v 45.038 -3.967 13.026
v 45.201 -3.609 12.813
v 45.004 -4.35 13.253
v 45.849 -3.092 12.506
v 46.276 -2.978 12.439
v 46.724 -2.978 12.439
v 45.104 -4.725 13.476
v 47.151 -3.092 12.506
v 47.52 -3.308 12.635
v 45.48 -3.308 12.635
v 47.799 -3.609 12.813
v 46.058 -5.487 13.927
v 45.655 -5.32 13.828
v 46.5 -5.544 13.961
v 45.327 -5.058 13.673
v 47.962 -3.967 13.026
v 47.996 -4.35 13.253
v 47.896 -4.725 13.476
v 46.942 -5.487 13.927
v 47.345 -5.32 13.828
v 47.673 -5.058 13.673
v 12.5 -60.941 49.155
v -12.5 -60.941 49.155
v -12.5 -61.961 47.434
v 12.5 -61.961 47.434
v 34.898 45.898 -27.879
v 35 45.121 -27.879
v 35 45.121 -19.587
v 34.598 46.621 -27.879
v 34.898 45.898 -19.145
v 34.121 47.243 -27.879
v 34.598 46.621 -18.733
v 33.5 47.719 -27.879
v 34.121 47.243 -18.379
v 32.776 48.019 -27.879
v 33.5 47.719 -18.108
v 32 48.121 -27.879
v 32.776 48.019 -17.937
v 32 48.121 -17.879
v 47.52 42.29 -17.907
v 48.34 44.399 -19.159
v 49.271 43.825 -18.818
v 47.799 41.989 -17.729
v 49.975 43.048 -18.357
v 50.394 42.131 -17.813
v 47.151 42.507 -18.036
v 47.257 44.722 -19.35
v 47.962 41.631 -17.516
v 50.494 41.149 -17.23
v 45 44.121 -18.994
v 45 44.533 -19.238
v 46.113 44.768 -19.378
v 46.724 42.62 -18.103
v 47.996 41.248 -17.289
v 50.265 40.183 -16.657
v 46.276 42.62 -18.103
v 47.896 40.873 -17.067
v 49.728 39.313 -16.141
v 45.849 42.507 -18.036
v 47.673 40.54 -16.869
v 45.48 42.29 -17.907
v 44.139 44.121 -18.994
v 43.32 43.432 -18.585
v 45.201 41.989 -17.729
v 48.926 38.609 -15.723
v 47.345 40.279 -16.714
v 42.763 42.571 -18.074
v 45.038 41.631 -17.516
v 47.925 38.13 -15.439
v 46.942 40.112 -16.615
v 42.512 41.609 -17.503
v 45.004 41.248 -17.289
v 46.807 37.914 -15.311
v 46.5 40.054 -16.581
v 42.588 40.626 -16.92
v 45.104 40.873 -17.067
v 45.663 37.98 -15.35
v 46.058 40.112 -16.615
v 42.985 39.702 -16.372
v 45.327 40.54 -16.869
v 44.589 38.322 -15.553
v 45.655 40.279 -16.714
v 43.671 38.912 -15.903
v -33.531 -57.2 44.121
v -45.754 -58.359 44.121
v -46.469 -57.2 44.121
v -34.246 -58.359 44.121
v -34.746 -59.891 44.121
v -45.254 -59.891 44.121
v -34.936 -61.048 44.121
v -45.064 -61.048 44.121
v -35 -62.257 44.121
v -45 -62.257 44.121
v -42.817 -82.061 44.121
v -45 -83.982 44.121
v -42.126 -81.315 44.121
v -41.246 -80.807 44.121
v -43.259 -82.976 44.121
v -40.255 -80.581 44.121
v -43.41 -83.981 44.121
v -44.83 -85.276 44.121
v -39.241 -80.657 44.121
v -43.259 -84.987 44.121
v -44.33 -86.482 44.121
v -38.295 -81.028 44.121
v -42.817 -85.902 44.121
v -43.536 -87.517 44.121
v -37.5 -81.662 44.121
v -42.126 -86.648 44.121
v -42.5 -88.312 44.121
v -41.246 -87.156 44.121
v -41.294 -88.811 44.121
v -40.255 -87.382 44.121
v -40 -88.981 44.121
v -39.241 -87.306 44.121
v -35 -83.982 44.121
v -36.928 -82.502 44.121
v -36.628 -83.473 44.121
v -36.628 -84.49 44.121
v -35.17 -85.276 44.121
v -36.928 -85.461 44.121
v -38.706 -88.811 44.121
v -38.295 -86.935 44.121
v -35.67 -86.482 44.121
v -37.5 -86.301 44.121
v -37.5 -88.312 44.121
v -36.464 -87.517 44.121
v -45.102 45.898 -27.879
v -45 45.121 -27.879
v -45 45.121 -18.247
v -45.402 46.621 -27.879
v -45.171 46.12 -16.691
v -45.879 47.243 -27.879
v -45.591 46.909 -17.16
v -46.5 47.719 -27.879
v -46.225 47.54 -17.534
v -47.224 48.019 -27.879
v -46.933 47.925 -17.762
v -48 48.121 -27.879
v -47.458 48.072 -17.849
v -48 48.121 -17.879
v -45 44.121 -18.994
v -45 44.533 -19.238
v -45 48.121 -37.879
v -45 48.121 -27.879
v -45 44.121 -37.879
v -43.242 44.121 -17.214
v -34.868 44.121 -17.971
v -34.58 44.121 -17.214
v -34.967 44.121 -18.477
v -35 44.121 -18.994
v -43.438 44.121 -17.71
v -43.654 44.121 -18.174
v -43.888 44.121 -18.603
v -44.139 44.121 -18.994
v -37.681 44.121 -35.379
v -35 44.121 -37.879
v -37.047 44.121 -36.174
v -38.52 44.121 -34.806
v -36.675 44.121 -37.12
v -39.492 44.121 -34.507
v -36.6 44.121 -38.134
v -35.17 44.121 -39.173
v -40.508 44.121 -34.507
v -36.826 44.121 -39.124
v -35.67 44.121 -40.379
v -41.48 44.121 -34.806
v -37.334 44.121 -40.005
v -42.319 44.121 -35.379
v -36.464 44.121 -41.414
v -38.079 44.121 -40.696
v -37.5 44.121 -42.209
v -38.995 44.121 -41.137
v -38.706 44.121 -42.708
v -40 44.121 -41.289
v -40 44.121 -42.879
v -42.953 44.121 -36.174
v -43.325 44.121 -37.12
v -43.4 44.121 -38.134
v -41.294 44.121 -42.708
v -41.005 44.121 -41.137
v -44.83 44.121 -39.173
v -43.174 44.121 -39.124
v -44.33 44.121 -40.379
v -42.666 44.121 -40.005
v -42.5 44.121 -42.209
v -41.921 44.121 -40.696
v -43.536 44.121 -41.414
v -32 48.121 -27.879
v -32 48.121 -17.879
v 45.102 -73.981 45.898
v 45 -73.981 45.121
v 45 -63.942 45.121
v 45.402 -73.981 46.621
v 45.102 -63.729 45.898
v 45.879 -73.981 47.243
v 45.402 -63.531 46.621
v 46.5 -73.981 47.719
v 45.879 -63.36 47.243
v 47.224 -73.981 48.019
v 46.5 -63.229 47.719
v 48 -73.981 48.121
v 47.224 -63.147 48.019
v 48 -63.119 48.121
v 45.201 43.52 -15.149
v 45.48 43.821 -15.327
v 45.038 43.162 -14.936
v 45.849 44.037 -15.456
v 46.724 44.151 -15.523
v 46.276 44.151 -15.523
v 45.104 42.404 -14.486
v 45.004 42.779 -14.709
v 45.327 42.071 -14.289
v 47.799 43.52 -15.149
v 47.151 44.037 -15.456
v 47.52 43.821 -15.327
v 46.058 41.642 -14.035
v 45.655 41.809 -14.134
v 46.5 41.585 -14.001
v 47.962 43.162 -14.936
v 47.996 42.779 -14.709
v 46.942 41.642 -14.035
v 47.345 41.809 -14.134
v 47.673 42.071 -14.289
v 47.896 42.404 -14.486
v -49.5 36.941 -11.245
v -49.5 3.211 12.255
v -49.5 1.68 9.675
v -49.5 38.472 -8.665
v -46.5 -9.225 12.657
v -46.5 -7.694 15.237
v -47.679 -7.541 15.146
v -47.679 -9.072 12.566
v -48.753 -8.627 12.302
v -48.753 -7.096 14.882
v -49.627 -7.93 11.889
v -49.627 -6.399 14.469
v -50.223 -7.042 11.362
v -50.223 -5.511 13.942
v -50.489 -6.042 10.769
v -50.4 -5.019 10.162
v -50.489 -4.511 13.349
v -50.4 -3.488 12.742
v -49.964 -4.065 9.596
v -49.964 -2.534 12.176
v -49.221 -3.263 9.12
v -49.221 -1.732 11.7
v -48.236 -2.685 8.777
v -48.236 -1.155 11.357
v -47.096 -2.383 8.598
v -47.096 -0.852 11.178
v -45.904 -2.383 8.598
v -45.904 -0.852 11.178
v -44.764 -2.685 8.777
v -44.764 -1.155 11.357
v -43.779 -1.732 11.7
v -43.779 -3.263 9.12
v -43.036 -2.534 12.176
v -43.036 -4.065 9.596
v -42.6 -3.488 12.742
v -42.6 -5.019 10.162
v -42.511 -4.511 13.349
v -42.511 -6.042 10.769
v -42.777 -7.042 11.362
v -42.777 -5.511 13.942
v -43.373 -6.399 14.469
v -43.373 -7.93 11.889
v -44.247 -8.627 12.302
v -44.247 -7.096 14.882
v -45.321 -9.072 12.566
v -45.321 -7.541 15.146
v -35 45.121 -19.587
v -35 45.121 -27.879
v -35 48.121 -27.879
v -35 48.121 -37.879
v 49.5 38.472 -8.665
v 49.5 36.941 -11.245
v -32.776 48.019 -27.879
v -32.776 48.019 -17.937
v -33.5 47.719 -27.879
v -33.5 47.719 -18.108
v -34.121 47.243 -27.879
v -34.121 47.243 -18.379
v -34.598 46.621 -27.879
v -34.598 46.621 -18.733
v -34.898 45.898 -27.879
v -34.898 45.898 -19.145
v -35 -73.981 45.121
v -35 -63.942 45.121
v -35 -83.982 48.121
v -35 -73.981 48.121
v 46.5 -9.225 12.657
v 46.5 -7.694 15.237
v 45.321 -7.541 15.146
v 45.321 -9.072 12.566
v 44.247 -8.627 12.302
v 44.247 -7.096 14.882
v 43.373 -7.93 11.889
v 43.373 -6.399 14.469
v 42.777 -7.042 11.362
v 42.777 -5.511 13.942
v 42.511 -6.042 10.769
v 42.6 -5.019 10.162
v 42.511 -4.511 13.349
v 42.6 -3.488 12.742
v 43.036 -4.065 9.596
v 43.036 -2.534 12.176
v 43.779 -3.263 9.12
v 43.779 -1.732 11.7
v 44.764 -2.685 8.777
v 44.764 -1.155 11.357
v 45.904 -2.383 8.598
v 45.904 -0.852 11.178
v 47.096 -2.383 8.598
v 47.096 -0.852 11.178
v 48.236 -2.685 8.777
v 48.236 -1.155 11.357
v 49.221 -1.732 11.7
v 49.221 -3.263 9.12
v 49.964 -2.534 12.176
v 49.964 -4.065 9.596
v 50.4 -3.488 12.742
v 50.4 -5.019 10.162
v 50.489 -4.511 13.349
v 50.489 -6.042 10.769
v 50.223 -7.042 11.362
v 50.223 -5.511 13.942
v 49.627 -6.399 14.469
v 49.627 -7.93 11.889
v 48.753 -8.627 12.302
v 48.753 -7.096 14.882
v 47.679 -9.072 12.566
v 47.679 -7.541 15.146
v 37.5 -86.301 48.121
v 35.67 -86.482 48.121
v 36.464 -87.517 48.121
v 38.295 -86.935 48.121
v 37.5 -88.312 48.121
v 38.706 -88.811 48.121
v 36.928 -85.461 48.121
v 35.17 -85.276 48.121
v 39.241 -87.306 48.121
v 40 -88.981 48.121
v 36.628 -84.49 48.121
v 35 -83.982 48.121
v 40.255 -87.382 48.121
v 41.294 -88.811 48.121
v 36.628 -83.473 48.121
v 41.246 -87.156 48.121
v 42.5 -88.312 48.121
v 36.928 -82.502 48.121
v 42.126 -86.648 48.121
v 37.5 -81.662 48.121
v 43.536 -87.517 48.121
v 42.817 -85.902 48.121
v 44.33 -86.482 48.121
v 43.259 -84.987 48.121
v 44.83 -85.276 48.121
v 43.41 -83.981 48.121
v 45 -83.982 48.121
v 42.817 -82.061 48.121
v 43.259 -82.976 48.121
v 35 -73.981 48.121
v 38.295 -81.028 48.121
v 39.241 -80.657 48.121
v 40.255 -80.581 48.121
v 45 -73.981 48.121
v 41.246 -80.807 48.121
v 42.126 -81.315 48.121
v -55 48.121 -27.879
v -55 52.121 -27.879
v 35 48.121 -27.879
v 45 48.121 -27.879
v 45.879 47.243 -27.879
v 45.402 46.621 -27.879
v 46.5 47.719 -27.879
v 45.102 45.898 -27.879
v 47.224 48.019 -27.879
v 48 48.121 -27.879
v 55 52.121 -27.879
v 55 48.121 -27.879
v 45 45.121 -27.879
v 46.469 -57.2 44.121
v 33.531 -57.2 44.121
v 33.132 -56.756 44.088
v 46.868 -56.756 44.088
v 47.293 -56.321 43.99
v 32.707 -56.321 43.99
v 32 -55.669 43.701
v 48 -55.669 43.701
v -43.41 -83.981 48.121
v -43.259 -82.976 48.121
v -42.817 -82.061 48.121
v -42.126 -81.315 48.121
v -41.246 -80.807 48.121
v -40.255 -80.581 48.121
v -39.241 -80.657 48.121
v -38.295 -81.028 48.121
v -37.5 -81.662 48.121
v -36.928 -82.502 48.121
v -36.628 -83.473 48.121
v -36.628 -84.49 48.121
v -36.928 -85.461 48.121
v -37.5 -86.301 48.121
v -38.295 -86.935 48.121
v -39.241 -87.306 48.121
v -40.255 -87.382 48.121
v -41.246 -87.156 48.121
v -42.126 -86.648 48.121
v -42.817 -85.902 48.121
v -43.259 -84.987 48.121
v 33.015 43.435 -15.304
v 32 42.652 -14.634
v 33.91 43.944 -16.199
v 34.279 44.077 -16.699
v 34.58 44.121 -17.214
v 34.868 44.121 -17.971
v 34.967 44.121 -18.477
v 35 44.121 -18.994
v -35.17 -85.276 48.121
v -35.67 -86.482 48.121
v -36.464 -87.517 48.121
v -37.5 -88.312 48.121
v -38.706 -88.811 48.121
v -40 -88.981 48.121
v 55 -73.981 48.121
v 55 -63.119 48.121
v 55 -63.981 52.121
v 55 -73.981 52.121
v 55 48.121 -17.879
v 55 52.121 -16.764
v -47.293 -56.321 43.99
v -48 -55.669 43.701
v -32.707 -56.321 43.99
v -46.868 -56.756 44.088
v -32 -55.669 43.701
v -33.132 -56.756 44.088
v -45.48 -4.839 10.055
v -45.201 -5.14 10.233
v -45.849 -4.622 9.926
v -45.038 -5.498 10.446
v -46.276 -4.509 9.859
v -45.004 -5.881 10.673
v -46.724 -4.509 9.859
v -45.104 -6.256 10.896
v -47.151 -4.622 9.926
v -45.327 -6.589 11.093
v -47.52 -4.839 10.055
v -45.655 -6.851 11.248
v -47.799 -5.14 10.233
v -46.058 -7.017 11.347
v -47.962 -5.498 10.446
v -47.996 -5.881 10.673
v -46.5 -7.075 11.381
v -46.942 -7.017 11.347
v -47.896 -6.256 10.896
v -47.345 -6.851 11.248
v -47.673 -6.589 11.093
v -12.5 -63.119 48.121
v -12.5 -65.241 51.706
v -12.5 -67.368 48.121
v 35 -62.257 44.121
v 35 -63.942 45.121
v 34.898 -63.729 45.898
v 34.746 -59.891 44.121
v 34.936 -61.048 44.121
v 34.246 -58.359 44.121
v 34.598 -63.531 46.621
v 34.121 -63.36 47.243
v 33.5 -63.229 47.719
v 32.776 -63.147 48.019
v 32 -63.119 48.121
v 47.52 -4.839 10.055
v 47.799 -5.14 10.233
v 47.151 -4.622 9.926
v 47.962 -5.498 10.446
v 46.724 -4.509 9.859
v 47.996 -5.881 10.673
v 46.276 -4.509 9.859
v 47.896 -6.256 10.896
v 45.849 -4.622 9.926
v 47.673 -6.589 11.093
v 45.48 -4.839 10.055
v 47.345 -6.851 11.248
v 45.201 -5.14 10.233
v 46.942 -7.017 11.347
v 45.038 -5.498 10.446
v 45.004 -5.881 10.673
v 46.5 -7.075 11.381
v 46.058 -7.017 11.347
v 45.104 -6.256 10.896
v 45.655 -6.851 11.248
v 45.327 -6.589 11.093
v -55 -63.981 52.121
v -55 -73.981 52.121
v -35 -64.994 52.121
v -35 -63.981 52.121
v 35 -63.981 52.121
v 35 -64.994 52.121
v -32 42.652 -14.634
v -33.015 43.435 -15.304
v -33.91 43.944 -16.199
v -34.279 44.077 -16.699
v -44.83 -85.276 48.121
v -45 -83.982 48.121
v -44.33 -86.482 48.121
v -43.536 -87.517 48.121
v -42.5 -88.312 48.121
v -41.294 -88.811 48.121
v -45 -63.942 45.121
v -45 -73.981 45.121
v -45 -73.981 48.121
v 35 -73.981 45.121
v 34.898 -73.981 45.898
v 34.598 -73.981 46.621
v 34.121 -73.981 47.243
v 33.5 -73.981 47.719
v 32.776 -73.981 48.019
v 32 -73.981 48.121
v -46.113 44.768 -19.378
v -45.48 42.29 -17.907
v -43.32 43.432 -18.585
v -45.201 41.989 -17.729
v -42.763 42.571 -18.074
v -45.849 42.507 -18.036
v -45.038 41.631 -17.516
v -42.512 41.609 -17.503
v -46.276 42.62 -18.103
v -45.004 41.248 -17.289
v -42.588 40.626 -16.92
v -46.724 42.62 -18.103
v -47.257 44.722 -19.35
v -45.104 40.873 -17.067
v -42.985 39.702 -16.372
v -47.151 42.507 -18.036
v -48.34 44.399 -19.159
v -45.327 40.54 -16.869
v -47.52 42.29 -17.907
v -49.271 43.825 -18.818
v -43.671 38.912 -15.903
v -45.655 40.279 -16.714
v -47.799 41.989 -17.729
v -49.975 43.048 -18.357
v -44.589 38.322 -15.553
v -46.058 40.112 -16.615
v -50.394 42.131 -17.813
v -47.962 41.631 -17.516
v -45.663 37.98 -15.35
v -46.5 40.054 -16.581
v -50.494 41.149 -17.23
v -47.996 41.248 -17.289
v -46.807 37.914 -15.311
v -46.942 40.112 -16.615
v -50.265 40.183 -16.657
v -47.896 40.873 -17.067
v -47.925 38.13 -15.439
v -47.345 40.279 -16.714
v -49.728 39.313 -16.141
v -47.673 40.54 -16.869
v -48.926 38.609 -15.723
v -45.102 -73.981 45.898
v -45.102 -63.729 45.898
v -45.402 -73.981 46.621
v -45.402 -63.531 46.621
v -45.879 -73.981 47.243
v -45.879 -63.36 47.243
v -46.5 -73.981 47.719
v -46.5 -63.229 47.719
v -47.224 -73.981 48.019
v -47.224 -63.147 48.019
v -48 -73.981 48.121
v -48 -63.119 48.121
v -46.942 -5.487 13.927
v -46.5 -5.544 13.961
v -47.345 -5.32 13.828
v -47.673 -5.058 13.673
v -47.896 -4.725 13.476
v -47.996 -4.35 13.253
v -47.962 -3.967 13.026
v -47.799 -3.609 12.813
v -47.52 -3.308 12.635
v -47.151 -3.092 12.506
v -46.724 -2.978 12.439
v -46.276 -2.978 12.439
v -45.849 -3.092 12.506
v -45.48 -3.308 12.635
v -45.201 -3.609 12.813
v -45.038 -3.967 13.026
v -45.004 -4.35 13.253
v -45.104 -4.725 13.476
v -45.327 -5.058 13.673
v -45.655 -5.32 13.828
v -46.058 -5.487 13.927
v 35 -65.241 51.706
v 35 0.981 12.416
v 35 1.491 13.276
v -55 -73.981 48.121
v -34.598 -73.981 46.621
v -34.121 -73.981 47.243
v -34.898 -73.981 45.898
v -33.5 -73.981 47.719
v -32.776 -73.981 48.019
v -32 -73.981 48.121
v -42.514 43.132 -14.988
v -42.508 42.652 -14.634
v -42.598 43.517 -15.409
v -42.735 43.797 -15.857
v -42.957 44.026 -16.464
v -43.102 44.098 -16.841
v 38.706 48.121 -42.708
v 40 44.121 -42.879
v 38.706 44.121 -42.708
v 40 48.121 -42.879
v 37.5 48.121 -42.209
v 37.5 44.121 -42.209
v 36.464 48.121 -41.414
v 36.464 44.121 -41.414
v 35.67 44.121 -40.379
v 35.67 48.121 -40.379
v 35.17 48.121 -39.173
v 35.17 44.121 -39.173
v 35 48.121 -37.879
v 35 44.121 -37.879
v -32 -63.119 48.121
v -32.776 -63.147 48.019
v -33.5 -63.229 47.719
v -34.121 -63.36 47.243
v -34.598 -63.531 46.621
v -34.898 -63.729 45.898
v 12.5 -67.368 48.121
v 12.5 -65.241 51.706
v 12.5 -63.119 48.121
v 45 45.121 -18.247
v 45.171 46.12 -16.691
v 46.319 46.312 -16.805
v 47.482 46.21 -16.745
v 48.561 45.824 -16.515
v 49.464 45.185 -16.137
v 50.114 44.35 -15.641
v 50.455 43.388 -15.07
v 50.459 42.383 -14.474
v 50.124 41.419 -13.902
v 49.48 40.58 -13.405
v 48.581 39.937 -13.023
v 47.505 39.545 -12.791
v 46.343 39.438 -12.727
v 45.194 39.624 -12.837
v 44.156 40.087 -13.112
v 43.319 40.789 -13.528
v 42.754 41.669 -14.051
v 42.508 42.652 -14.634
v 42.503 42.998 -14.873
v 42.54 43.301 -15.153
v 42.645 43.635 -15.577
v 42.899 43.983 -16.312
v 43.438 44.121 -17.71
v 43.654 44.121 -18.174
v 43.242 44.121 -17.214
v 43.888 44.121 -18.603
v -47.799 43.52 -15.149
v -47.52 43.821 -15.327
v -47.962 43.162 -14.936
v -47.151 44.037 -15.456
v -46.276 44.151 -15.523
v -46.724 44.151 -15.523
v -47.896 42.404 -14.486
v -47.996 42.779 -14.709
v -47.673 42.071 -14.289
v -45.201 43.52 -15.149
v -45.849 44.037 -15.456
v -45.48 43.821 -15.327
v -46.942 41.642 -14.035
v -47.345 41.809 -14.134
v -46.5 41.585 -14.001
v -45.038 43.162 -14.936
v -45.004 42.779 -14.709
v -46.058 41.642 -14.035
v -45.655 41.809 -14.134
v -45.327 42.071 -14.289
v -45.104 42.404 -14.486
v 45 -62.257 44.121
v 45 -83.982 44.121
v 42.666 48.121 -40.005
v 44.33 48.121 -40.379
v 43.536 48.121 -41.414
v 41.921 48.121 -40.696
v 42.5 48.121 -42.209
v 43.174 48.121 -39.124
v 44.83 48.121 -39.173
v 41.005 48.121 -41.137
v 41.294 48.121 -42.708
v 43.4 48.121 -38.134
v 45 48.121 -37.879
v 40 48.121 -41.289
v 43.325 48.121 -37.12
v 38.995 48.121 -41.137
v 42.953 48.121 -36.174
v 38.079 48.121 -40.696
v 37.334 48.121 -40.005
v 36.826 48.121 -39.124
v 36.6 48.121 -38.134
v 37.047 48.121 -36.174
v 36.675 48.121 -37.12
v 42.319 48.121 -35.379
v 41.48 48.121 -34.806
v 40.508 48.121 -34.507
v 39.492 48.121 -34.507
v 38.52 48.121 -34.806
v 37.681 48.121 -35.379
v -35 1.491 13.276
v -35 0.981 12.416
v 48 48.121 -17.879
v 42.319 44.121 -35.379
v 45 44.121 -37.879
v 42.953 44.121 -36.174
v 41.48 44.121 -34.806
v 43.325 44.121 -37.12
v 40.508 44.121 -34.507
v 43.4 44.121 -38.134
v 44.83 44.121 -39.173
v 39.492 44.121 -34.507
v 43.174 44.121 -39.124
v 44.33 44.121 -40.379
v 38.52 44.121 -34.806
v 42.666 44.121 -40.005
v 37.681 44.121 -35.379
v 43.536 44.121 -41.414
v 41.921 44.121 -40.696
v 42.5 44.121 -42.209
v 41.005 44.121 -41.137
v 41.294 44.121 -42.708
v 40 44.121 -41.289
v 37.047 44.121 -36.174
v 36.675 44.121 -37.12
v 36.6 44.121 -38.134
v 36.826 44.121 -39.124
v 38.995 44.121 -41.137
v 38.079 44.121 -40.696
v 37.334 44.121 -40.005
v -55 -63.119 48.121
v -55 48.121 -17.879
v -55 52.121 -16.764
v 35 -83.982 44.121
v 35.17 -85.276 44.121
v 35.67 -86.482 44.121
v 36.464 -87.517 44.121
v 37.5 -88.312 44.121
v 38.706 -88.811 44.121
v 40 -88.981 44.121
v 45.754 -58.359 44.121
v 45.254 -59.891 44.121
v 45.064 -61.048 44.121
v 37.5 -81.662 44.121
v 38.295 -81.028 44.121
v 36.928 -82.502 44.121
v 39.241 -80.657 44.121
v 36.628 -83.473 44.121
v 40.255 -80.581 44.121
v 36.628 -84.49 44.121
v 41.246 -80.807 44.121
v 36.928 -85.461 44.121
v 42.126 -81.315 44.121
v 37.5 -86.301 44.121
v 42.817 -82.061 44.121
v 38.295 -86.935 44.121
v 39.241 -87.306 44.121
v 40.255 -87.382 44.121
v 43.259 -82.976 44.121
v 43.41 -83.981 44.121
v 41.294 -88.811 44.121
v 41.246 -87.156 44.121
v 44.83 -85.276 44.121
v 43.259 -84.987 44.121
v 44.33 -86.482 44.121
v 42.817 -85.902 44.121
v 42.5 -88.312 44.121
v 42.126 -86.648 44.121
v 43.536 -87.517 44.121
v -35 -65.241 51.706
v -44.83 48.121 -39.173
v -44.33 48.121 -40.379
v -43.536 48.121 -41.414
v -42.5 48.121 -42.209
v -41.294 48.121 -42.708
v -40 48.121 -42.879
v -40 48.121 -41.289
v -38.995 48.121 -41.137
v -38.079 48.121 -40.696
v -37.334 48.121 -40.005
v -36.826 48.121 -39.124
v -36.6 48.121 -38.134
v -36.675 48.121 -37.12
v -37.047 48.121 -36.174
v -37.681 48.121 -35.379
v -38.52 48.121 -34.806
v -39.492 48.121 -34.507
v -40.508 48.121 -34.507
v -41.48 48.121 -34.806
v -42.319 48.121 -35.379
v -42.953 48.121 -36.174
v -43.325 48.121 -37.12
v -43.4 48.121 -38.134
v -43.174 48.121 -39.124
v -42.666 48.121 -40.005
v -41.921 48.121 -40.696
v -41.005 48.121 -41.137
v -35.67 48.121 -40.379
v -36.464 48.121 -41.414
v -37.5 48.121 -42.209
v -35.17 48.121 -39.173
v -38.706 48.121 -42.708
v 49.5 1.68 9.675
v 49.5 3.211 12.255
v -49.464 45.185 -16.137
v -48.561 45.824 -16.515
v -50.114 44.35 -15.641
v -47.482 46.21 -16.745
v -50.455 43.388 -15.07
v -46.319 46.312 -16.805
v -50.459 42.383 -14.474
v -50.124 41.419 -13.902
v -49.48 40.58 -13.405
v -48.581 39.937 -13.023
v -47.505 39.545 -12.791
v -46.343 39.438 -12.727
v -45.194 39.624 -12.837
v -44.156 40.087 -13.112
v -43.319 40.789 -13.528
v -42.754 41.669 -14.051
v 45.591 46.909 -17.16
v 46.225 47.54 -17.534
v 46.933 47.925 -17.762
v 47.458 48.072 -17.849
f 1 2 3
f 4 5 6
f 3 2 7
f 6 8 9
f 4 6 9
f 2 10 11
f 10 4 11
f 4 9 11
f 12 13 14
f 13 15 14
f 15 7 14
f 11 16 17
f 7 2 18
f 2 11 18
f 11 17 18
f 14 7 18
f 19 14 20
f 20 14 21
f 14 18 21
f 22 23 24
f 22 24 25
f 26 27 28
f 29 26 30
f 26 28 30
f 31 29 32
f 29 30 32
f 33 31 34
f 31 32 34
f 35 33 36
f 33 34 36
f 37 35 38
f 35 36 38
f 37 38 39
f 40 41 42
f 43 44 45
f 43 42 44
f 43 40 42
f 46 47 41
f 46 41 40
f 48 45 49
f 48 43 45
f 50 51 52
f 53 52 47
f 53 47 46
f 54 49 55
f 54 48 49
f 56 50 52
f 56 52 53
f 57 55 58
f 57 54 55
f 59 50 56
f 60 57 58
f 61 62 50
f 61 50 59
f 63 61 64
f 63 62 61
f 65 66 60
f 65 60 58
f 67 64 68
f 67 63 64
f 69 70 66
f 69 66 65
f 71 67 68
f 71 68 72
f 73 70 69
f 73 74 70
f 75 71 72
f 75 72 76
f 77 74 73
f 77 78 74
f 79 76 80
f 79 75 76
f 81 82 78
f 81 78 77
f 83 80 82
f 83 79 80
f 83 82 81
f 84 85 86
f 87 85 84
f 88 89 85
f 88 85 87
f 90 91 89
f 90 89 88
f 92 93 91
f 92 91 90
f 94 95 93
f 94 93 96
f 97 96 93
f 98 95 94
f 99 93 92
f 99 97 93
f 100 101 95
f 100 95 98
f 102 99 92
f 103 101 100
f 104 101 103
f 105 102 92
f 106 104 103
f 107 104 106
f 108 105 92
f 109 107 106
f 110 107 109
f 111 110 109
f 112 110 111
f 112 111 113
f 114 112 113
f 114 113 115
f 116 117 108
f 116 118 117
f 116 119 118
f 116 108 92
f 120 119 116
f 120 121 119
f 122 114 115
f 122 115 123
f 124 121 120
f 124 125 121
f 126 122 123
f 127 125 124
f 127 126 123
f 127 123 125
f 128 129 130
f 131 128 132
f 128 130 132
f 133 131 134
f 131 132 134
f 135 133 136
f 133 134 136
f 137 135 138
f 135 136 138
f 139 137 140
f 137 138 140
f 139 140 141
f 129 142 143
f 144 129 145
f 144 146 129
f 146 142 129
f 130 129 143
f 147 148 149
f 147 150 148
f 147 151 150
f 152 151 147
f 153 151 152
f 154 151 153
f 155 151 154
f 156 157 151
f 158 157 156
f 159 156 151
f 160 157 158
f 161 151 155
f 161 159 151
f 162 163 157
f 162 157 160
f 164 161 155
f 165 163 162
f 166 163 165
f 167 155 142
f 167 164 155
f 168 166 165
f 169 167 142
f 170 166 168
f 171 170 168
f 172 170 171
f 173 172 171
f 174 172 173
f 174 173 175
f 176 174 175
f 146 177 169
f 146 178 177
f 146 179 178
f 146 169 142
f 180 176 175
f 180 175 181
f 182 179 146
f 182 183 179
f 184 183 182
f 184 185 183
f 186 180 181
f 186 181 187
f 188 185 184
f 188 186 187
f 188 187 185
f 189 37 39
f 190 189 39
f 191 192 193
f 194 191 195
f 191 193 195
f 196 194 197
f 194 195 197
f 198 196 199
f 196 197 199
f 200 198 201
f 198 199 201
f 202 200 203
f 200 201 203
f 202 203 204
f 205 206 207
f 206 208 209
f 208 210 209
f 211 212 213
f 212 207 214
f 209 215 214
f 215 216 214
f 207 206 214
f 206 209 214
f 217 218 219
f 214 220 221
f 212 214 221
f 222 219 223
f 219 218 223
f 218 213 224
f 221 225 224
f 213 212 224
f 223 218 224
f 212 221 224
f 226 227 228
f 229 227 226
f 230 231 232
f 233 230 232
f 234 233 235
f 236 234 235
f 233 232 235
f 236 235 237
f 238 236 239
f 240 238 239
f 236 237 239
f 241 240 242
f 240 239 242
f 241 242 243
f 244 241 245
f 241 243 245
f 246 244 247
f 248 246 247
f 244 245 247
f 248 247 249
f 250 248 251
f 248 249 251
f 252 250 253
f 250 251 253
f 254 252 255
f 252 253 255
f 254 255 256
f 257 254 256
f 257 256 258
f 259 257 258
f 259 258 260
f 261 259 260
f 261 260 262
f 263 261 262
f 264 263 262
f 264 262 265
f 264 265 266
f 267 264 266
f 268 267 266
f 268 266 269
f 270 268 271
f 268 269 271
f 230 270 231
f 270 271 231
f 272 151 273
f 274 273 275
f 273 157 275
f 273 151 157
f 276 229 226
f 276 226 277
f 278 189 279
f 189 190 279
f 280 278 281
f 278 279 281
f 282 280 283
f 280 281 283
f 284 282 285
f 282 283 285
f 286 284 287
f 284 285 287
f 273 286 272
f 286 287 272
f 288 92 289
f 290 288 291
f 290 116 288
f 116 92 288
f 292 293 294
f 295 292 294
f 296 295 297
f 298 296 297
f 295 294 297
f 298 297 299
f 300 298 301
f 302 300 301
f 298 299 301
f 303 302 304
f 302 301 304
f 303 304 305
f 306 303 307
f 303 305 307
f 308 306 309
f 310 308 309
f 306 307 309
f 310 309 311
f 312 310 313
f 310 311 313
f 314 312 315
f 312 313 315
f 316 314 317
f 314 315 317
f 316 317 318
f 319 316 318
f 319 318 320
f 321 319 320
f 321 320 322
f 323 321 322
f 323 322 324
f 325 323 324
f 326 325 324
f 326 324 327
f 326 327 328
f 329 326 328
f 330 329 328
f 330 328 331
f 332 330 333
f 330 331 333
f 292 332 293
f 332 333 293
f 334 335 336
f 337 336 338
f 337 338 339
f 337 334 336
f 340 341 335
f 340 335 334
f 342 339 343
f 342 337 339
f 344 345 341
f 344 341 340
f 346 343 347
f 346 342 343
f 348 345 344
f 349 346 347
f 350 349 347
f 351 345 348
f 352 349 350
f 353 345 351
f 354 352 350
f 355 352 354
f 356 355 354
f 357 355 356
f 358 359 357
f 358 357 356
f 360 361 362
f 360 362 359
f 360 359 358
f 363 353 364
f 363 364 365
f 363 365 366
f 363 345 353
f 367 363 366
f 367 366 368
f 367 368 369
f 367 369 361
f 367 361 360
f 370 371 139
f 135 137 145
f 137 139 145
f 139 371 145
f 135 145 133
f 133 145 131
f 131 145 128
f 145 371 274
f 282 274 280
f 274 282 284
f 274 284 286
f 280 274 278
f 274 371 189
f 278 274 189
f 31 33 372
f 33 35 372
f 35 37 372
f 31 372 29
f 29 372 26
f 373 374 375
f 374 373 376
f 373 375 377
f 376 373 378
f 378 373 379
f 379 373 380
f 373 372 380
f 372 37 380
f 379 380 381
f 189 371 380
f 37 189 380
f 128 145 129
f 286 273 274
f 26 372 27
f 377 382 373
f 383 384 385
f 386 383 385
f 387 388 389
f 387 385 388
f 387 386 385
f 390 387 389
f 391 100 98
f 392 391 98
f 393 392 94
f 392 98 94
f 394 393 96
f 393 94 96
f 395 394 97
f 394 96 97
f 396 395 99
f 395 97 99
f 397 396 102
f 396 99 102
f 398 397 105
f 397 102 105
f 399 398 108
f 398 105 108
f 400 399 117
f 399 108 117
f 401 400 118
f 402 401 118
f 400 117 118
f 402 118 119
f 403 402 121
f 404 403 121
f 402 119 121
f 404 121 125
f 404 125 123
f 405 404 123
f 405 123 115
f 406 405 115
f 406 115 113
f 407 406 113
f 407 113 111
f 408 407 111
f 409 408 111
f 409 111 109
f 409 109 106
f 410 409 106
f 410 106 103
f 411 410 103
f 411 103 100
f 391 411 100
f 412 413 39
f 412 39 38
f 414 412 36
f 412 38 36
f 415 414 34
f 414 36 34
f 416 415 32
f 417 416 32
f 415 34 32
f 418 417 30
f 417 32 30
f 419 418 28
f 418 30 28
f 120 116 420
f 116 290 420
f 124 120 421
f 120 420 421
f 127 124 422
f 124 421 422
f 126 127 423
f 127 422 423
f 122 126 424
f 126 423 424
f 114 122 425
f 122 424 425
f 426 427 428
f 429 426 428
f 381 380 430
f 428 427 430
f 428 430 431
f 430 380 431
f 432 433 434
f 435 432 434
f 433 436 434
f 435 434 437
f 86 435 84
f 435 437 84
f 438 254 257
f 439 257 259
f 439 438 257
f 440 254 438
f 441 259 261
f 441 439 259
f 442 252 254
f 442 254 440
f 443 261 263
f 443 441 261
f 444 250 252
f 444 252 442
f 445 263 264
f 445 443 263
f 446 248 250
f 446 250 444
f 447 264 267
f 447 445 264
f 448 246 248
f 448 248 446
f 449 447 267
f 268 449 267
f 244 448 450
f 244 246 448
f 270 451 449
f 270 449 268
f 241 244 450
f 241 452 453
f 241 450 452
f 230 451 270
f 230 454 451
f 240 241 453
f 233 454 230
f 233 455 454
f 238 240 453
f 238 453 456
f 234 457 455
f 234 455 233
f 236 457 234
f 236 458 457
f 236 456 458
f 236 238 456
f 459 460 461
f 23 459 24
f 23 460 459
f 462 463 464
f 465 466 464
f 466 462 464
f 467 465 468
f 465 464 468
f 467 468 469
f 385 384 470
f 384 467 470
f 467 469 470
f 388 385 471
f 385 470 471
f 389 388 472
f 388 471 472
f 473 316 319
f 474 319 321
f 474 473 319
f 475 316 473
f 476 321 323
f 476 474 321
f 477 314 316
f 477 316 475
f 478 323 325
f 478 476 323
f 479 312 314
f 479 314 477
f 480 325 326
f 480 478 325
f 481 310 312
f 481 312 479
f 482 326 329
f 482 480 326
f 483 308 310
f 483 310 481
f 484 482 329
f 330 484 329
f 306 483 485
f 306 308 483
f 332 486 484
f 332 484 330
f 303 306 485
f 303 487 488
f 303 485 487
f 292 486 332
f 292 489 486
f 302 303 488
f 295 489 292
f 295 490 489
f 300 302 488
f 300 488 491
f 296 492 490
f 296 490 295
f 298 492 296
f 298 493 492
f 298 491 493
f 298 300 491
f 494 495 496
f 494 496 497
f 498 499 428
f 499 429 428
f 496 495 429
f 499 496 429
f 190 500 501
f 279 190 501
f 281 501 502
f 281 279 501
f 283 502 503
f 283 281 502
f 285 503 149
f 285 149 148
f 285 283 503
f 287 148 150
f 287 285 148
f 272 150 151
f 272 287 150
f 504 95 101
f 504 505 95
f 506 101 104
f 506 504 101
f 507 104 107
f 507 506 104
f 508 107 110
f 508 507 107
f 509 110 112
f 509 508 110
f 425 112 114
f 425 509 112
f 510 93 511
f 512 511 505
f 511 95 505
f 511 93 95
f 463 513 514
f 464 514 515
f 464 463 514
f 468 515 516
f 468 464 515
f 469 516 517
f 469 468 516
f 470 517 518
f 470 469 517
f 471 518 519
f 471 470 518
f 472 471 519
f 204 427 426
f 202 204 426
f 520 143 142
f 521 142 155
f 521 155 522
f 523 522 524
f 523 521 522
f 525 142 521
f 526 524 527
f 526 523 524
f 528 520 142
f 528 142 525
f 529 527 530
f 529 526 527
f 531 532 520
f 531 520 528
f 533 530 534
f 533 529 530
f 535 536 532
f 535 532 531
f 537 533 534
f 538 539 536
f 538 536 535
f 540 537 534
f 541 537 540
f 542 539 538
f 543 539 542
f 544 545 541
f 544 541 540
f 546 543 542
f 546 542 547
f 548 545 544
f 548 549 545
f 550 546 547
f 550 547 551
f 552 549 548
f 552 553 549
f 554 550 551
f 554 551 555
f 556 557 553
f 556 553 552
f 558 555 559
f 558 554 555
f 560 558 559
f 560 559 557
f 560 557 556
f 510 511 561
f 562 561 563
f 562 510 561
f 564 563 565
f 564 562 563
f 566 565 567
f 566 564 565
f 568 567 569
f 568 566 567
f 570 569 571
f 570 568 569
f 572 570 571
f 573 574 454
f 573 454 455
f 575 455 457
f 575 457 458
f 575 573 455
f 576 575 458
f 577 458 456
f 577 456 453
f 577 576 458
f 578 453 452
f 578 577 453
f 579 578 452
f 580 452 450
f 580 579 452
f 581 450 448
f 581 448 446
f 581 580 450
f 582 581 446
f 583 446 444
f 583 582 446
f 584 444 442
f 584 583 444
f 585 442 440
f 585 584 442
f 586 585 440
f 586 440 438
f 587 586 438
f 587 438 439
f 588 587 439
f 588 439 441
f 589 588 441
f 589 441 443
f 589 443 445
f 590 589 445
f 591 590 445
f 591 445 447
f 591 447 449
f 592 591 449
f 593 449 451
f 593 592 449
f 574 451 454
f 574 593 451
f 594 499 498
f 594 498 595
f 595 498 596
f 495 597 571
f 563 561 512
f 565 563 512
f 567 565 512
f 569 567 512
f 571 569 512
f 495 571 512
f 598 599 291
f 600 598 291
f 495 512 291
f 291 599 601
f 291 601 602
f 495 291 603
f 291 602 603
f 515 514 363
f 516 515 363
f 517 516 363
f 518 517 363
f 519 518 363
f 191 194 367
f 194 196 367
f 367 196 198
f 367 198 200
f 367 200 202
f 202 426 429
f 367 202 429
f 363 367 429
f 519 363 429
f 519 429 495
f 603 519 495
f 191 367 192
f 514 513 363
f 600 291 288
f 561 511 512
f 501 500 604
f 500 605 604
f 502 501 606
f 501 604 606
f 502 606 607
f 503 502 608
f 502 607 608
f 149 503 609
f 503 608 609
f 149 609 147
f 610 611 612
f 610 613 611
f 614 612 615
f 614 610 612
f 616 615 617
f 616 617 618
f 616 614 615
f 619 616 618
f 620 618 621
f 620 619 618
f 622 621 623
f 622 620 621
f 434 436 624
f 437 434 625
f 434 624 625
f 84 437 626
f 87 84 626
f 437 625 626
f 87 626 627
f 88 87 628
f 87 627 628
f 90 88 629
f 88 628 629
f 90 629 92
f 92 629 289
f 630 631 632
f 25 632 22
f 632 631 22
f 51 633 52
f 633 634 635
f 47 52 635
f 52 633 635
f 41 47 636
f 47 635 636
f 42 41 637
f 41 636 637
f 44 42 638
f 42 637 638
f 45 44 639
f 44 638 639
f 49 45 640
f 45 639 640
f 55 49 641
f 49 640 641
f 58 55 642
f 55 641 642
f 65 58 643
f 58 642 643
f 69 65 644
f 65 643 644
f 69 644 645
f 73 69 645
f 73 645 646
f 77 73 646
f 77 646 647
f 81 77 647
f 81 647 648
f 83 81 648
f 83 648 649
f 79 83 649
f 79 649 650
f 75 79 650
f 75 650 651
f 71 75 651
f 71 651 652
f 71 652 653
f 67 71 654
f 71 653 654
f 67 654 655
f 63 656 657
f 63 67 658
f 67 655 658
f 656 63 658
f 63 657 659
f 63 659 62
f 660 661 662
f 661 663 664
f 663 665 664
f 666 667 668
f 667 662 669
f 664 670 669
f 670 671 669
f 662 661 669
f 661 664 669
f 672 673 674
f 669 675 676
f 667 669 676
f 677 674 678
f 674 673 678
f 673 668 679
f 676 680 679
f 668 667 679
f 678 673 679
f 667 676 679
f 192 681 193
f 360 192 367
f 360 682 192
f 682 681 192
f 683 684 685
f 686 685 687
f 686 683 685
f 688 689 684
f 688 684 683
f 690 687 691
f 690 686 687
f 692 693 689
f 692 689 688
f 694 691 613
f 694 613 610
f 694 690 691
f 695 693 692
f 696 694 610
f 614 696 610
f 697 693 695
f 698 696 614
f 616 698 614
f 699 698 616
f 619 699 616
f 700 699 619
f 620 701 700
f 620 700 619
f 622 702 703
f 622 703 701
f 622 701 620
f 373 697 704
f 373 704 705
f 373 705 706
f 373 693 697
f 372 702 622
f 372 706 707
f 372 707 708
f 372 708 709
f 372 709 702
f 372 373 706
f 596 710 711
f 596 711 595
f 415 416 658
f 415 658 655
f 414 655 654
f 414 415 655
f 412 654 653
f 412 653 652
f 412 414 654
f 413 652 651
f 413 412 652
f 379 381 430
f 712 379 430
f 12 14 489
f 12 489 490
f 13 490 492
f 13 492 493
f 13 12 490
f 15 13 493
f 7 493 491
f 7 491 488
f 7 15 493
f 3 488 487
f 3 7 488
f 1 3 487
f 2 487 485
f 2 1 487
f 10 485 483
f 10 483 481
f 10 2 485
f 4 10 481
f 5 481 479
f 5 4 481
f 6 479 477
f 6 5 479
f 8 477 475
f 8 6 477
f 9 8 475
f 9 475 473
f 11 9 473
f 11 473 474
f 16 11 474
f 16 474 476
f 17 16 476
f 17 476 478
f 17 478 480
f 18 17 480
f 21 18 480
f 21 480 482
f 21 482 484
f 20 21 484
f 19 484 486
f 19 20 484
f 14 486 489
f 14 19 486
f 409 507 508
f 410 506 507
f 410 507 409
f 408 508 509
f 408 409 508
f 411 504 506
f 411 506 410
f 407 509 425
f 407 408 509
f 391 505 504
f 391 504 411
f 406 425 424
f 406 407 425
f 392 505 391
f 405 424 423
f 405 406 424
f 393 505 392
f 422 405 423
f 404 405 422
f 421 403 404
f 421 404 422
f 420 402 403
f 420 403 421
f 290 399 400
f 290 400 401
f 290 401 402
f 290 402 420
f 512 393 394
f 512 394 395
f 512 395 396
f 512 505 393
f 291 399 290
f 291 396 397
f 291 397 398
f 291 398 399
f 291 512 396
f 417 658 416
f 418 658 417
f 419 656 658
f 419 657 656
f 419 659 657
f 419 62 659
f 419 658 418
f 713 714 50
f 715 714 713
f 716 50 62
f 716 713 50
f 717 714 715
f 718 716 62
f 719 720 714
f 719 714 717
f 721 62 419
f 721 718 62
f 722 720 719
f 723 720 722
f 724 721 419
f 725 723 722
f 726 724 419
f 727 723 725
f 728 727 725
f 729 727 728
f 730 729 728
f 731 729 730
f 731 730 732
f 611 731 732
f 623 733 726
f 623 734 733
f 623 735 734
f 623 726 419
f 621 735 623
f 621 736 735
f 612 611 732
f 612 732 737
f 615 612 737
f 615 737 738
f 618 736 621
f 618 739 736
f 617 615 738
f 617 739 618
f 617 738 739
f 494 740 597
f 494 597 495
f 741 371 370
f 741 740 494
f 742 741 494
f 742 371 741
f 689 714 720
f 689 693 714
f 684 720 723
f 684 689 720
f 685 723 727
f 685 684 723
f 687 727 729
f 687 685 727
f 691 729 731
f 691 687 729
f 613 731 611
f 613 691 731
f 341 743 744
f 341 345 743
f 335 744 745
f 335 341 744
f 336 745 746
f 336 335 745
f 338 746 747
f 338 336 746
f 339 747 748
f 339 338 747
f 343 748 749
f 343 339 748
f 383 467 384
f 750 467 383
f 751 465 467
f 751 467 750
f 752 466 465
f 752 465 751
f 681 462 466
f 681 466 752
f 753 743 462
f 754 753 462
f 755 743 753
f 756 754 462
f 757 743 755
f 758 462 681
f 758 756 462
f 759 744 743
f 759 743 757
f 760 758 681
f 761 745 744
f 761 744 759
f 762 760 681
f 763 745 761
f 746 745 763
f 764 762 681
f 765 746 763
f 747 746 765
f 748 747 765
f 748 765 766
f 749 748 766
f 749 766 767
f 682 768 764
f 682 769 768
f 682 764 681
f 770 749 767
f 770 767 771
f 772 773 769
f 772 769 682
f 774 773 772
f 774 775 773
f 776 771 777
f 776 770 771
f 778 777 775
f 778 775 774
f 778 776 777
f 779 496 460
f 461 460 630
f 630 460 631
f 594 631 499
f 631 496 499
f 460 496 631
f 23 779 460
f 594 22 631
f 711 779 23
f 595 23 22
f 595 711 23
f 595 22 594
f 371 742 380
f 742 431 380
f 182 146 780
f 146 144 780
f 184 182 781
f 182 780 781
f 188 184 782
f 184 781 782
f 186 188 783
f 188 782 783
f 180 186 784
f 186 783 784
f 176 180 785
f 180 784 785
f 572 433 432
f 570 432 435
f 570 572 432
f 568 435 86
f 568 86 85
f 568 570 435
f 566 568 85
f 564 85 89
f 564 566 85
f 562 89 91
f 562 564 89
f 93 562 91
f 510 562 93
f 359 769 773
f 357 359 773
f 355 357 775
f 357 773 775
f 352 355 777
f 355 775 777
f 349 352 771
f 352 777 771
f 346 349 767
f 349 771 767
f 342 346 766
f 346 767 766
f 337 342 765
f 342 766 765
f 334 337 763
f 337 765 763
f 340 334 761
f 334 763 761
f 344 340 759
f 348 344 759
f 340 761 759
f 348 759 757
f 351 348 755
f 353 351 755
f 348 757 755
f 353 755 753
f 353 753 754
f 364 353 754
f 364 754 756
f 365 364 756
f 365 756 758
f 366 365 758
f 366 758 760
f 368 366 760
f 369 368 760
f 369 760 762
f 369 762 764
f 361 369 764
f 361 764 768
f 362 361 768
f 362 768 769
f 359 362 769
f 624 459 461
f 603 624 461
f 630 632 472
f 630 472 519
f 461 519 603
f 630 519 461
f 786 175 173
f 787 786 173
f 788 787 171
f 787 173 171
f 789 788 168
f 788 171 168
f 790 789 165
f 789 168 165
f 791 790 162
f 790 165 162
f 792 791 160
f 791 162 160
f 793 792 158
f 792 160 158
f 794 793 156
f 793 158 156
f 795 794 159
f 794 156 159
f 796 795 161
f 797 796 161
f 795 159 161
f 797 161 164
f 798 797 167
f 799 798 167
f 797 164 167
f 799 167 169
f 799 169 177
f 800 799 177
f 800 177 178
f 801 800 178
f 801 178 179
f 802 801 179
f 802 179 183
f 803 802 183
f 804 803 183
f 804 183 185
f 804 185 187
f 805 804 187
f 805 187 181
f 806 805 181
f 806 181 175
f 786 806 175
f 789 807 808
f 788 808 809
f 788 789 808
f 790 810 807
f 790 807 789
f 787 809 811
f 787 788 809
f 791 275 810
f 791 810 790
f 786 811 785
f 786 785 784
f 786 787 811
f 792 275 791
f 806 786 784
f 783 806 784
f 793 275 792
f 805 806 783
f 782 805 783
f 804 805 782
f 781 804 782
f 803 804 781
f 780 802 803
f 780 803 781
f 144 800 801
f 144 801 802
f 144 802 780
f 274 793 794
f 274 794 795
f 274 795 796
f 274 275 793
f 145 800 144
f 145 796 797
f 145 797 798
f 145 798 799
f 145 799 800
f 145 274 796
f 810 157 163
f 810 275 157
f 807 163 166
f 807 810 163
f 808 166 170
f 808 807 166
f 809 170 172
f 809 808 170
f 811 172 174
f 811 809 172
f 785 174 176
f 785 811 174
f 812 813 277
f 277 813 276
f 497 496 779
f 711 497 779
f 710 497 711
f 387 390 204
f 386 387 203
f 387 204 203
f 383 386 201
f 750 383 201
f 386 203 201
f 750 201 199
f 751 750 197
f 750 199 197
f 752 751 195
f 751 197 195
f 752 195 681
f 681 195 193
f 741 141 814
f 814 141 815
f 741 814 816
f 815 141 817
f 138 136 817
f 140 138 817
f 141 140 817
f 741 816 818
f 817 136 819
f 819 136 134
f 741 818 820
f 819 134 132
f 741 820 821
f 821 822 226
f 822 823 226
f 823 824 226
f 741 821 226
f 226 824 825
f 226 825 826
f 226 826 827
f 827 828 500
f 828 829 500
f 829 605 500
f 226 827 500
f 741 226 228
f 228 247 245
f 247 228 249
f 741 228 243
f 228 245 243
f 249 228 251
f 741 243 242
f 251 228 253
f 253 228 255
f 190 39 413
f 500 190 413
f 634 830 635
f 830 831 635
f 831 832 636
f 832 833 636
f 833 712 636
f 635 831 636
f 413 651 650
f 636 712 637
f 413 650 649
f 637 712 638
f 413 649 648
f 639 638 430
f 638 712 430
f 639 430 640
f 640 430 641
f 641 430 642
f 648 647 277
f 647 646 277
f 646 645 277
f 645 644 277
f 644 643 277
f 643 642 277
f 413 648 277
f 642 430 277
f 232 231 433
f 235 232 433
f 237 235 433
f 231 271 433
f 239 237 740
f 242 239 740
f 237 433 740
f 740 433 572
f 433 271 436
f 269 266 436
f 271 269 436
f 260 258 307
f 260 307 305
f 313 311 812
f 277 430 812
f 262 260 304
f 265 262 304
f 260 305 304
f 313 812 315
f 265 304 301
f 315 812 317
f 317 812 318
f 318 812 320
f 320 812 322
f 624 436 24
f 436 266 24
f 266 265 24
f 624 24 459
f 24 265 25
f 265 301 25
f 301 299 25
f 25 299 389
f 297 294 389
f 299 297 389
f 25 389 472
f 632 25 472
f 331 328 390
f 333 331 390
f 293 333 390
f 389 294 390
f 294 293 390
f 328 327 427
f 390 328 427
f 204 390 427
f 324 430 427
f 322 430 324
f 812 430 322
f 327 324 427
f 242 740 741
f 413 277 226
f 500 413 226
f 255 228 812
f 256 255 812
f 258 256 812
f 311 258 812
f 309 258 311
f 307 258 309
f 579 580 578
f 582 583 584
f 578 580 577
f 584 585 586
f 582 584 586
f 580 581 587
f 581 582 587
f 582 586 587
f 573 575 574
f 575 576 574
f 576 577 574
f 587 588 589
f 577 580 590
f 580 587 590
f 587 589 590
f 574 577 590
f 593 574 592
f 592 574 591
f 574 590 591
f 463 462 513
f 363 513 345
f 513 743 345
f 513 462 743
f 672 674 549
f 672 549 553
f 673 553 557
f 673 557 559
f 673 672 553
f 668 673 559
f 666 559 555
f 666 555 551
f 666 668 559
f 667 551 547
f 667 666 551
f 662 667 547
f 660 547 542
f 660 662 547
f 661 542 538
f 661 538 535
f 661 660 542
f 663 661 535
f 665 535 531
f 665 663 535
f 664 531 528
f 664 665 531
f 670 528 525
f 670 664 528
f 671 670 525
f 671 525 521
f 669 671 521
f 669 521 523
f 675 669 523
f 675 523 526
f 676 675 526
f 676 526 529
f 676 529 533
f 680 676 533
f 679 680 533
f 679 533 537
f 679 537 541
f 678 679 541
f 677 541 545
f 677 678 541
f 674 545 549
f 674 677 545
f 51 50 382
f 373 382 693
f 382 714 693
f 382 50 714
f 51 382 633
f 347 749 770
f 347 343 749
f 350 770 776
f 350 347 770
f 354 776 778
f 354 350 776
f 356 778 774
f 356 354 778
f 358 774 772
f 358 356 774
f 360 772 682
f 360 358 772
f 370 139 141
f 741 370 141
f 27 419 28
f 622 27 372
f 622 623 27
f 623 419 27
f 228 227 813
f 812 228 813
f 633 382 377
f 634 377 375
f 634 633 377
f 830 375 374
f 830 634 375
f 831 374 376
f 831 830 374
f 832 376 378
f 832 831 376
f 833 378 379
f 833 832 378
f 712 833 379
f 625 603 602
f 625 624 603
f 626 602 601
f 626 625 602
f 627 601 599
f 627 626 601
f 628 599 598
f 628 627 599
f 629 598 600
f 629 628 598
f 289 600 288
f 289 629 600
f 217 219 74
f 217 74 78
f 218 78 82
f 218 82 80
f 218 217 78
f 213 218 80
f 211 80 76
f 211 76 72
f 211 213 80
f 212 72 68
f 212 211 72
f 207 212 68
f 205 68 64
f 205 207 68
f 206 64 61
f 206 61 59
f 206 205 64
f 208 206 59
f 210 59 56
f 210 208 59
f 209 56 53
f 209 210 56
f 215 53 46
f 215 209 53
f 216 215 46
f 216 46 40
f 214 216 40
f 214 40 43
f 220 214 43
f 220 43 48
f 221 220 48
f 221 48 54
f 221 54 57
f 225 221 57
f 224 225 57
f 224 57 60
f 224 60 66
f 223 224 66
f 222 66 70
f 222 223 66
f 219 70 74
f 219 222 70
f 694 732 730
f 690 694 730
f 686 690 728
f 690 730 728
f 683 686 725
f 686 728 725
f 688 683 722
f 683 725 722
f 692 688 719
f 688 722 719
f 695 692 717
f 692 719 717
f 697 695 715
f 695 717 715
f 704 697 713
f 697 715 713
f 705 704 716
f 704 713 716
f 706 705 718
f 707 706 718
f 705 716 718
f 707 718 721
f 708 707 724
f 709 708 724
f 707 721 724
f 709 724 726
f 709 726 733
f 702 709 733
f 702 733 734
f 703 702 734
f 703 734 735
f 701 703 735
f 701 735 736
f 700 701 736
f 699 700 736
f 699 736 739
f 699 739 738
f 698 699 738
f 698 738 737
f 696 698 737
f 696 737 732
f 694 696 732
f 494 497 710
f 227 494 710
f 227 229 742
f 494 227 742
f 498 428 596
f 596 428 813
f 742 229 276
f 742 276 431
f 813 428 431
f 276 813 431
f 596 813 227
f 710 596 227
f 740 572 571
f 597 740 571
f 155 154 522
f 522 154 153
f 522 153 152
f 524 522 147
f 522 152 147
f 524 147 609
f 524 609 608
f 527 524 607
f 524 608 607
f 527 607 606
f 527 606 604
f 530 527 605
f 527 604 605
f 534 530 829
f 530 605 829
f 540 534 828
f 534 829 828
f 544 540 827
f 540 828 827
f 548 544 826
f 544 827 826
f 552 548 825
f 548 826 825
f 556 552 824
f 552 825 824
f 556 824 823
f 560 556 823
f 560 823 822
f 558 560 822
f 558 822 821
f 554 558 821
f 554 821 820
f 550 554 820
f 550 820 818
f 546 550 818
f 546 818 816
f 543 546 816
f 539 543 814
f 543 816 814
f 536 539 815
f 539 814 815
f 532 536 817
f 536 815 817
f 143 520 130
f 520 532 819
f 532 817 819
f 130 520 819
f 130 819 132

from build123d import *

# Parameters (mm, degrees)
BOSS_EXTRUDE1_DEPTH             = 55
CUT_EXTRUDE1_REACH              = 107.787
SKETCH3_W                       = 99
SKETCH3_H                       = 41
SKETCH4_W                       = 70
SKETCH4_H                       = 77
CUT_EXTRUDE2_DEPTH              = 1
SKETCH5_R                       = 4
SKETCH5_R_2                     = 1.5
BOSS_EXTRUDE2_DEPTH             = 3
SKETCH6_W                       = 10
SKETCH6_H                       = 4
BOSS_EXTRUDE3_DEPTH             = 15
BOSS_EXTRUDE3_DIRECTION_2_REACH = 124.058
CUT_EXTRUDE3_REACH              = 142.321
SKETCH7_R                       = 3.41
FILLET1_R                       = 3
FILLET2_R                       = 5
CUT_EXTRUDE4_REACH              = 112.137
SKETCH8_W                       = 25
SKETCH8_H                       = 5
SKETCH9_W                       = 10
SKETCH9_H                       = 4
BOSS_EXTRUDE4_DEPTH             = 15
BOSS_EXTRUDE4_DIRECTION_2_REACH = 149.117
CUT_EXTRUDE5_REACH              = 138.058
SKETCH10_R                      = 3.41
FILLET3_R                       = 3
FILLET4_R                       = 5


with BuildPart() as part:
    # Sketch2 → Boss-Extrude1 (new, symmetric)
    with BuildSketch(Plane(origin=(0, 0, 0), x_dir=(0, 0, -1), z_dir=(1, 0, 0))):
        Polygon((-52.121320344, -63.981493427), (16.76363182, 52.121320344), (27.878679656, 52.121320344), (27.878679656, 48.121320344), (17.878679656, 48.121320344), (-48.121320344, -63.119022696), (-48.121320344, -73.981493427), (-52.121320344, -73.981493427), align=None)
    extrude(amount=BOSS_EXTRUDE1_DEPTH, both=True)

    # Sketch3 → Cut-Extrude1 (cut, up to next)
    with BuildSketch(Plane(origin=(0, 6.214083509, 10.473587595), x_dir=(1, 0, 0), z_dir=(0, 0.5102589049122125, 0.8600208427461452)), mode=Mode.PRIVATE) as cut_extrude1_sk1:
        with Locations((0, 17.008093979)):
            Rectangle(SKETCH3_W, SKETCH3_H)
    cut_extrude1_tool1 = extrude(cut_extrude1_sk1.sketch, amount=-CUT_EXTRUDE1_REACH, mode=Mode.PRIVATE) & part.part
    add(cut_extrude1_tool1.solids().sort_by_distance((0, 20.841399, 1.795056))[0], mode=Mode.SUBTRACT)

    # Sketch4 → Cut-Extrude2 (cut)
    with BuildSketch(Plane(origin=(0, 6.214083509, 10.473587595), x_dir=(1, 0, 0), z_dir=(0, 0.5102589049122125, 0.8600208427461452))):
        with Locations((0, -43.991906021)):
            Rectangle(SKETCH4_W, SKETCH4_H)
    extrude(amount=-CUT_EXTRUDE2_DEPTH, mode=Mode.SUBTRACT)

    # Sketch5 → Boss-Extrude2 (add)
    # profile 1 of 4: a face of its own
    with BuildSketch(Plane(origin=(0, 4.683306794, 7.893525066), x_dir=(-1, 0, 0), z_dir=(0, -0.5102589049122127, -0.8600208427461451))):
        with Locations(Location((-46.5, 44.408093979, 0), (0, 0, 270))):
            Circle(SKETCH5_R)
        with Locations(Location((-46.5, 44.408093979, 0), (0, 0, 270))):
            Circle(SKETCH5_R_2, mode=Mode.SUBTRACT)
    # profile 2 of 4: a face of its own
    with BuildSketch(Plane(origin=(0, 4.683306794, 7.893525066), x_dir=(-1, 0, 0), z_dir=(0, -0.5102589049122127, -0.8600208427461451))):
        with Locations(Location((-46.5, -10.391906021, 0), (0, 0, 270))):
            Circle(SKETCH5_R)
        with Locations(Location((-46.5, -10.391906021, 0), (0, 0, 270))):
            Circle(SKETCH5_R_2, mode=Mode.SUBTRACT)
    # profile 3 of 4: a face of its own
    with BuildSketch(Plane(origin=(0, 4.683306794, 7.893525066), x_dir=(-1, 0, 0), z_dir=(0, -0.5102589049122127, -0.8600208427461451))):
        with Locations(Location((46.5, -10.391906021, 0), (0, 0, 270))):
            Circle(SKETCH5_R)
        with Locations(Location((46.5, -10.391906021, 0), (0, 0, 270))):
            Circle(SKETCH5_R_2, mode=Mode.SUBTRACT)
    # profile 4 of 4: a face of its own
    with BuildSketch(Plane(origin=(0, 4.683306794, 7.893525066), x_dir=(-1, 0, 0), z_dir=(0, -0.5102589049122127, -0.8600208427461451))):
        with Locations(Location((46.5, 44.408093979, 0), (0, 0, 270))):
            Circle(SKETCH5_R)
        with Locations(Location((46.5, 44.408093979, 0), (0, 0, 270))):
            Circle(SKETCH5_R_2, mode=Mode.SUBTRACT)
    extrude(amount=BOSS_EXTRUDE2_DEPTH)

    # Sketch6 → Boss-Extrude3 (add)
    with BuildSketch(Plane(origin=(0, 0, -27.878679656), x_dir=(-1, 0, 0), z_dir=(0, 0, -1))):
        with Locations((40, 46.121320344)):
            Rectangle(SKETCH6_W, SKETCH6_H)
        with Locations((-40, 46.121320344)):
            Rectangle(SKETCH6_W, SKETCH6_H)
    extrude(amount=BOSS_EXTRUDE3_DEPTH)

    # Sketch6 → Boss-Extrude3 direction 2 (add, up to next)
    with BuildSketch(Plane(origin=(0, 0, -27.878679656), x_dir=(-1, 0, 0), z_dir=(0, 0, -1)), mode=Mode.PRIVATE) as boss_extrude3_direction_2_sk1:
        with Locations((40, 46.121320344)):
            Rectangle(SKETCH6_W, SKETCH6_H)
    boss_extrude3_direction_2_tool1 = extrude(boss_extrude3_direction_2_sk1.sketch, amount=-BOSS_EXTRUDE3_DIRECTION_2_REACH, mode=Mode.PRIVATE) - part.part
    # Sketch6 → Boss-Extrude3 direction 2 (add, up to next)
    with BuildSketch(Plane(origin=(0, 0, -27.878679656), x_dir=(-1, 0, 0), z_dir=(0, 0, -1)), mode=Mode.PRIVATE) as boss_extrude3_direction_2_sk2:
        with Locations((-40, 46.121320344)):
            Rectangle(SKETCH6_W, SKETCH6_H)
    boss_extrude3_direction_2_tool2 = extrude(boss_extrude3_direction_2_sk2.sketch, amount=-BOSS_EXTRUDE3_DIRECTION_2_REACH, mode=Mode.PRIVATE) - part.part
    add(boss_extrude3_direction_2_tool1.solids().sort_by_distance((-40, 46.12132, -27.87868))[0])
    add(boss_extrude3_direction_2_tool2.solids().sort_by_distance((40, 46.12132, -27.87868))[0])

    # Sketch7 → Cut-Extrude3 (cut, up to next)
    with BuildSketch(Plane.XZ.offset(-44.121320344), mode=Mode.PRIVATE) as cut_extrude3_sk1:
        with Locations(Location((-40, -37.878679656, 0), (0, 0, 270))):
            Circle(SKETCH7_R)
    cut_extrude3_tool1 = extrude(cut_extrude3_sk1.sketch, amount=-CUT_EXTRUDE3_REACH, mode=Mode.PRIVATE) & part.part
    # Sketch7 → Cut-Extrude3 (cut, up to next)
    with BuildSketch(Plane.XZ.offset(-44.121320344), mode=Mode.PRIVATE) as cut_extrude3_sk2:
        with Locations(Location((40, -37.878679656, 0), (0, 0, 270))):
            Circle(SKETCH7_R)
    cut_extrude3_tool2 = extrude(cut_extrude3_sk2.sketch, amount=-CUT_EXTRUDE3_REACH, mode=Mode.PRIVATE) & part.part
    add(cut_extrude3_tool1.solids().sort_by_distance((-40, 44.12132, -37.87868))[0], mode=Mode.SUBTRACT)
    add(cut_extrude3_tool2.solids().sort_by_distance((40, 44.12132, -37.87868))[0], mode=Mode.SUBTRACT)

    # Fillet1
    fillet1_edges = [part.edges().sort_by_distance(p)[0] for p in [
        (-35, 46.121320344, -16.692059799),
        (35, 46.121320344, -16.692059799),
        (45, 48.121320344, -22.878679656),
        (35, 48.121320344, -22.878679656),
        (38.885828328, 44.121320344, -15.505439942),
        (-38.885828328, 44.121320344, -15.505439942),
        (-45, 48.121320344, -22.878679656),
        (-35, 48.121320344, -22.878679656),
    ]]
    fillet(fillet1_edges, radius=FILLET1_R)

    # Fillet2
    fillet2_edges = [part.edges().sort_by_distance(p)[0] for p in [
        (45, 46.121320344, -42.878679656),
        (35, 46.121320344, -42.878679656),
        (-35, 46.121320344, -42.878679656),
        (-45, 46.121320344, -42.878679656),
    ]]
    fillet(fillet2_edges, radius=FILLET2_R - 0.0001)  # a hair under: the kernel refuses the full size

    # Sketch8 → Cut-Extrude4 (cut, up to next)
    with BuildSketch(Plane(origin=(0, 5.703824604, 9.613566752), x_dir=(1, 0, 0), z_dir=(0, 0.5102589049122124, 0.8600208427461452)), mode=Mode.PRIVATE) as cut_extrude4_sk1:
        with Locations((0, -79.991906021)):
            Rectangle(SKETCH8_W, SKETCH8_H)
    cut_extrude4_tool1 = extrude(cut_extrude4_sk1.sketch, amount=-CUT_EXTRUDE4_REACH, mode=Mode.PRIVATE) & part.part
    add(cut_extrude4_tool1.solids().sort_by_distance((0, -63.090882, 50.430149))[0], mode=Mode.SUBTRACT)

    # Sketch9 → Boss-Extrude4 (add)
    with BuildSketch(Plane.XZ.offset(73.981493427)):
        with Locations((-40, 46.121320344)):
            Rectangle(SKETCH9_W, SKETCH9_H)
        with Locations((40, 46.121320344)):
            Rectangle(SKETCH9_W, SKETCH9_H)
    extrude(amount=BOSS_EXTRUDE4_DEPTH)

    # Boss-Extrude4 direction 2: up to this plane
    boss_extrude4_direction_2_end = Plane(origin=(55, 48.121320344, -17.878679656), z_dir=(0, 0.5102589049122126, 0.8600208427461451))
    # Sketch9 → Boss-Extrude4 direction 2 (add, up to the surface)
    with BuildSketch(Plane.XZ.offset(73.981493427), mode=Mode.PRIVATE) as boss_extrude4_direction_2_sk1:
        with Locations((-40, 46.121320344)):
            Rectangle(SKETCH9_W, SKETCH9_H)
    boss_extrude4_direction_2_tool1 = split(extrude(boss_extrude4_direction_2_sk1.sketch, amount=-BOSS_EXTRUDE4_DIRECTION_2_REACH, mode=Mode.PRIVATE), bisect_by=boss_extrude4_direction_2_end, keep=Keep.BOTH, mode=Mode.PRIVATE)
    add(boss_extrude4_direction_2_tool1.solids().sort_by_distance((-40, -73.981493, 46.12132))[0])
    # Sketch9 → Boss-Extrude4 direction 2 (add, up to the surface)
    with BuildSketch(Plane.XZ.offset(73.981493427), mode=Mode.PRIVATE) as boss_extrude4_direction_2_sk2:
        with Locations((40, 46.121320344)):
            Rectangle(SKETCH9_W, SKETCH9_H)
    boss_extrude4_direction_2_tool2 = split(extrude(boss_extrude4_direction_2_sk2.sketch, amount=-BOSS_EXTRUDE4_DIRECTION_2_REACH, mode=Mode.PRIVATE), bisect_by=boss_extrude4_direction_2_end, keep=Keep.BOTH, mode=Mode.PRIVATE)
    add(boss_extrude4_direction_2_tool2.solids().sort_by_distance((40, -73.981493, 46.12132))[0])

    # Sketch10 → Cut-Extrude5 (cut, up to next)
    with BuildSketch(Plane(origin=(0, 0, 44.121320344), x_dir=(-1, 0, 0), z_dir=(0, 0, -1)), mode=Mode.PRIVATE) as cut_extrude5_sk1:
        with Locations((40, -83.981493427)):
            Circle(SKETCH10_R)
    cut_extrude5_tool1 = extrude(cut_extrude5_sk1.sketch, amount=-CUT_EXTRUDE5_REACH, mode=Mode.PRIVATE) & part.part
    # Sketch10 → Cut-Extrude5 (cut, up to next)
    with BuildSketch(Plane(origin=(0, 0, 44.121320344), x_dir=(-1, 0, 0), z_dir=(0, 0, -1)), mode=Mode.PRIVATE) as cut_extrude5_sk2:
        with Locations(Location((-40, -83.981493427, 0), (0, 0, 180))):
            Circle(SKETCH10_R)
    cut_extrude5_tool2 = extrude(cut_extrude5_sk2.sketch, amount=-CUT_EXTRUDE5_REACH, mode=Mode.PRIVATE) & part.part
    add(cut_extrude5_tool1.solids().sort_by_distance((-40, -83.981493, 44.12132))[0], mode=Mode.SUBTRACT)
    add(cut_extrude5_tool2.solids().sort_by_distance((40, -83.981493, 44.12132))[0], mode=Mode.SUBTRACT)

    # Fillet3
    fillet3_edges = [part.edges().sort_by_distance(p)[0] for p in [
        (-45, -68.550258061, 48.121320344),
        (-35, -59.74810321, 46.121320344),
        (-35, -68.550258061, 48.121320344),
        (-40, -56.377183724, 44.121320344),
        (-45, -59.74810321, 46.121320344),
        (35, -68.550258061, 48.121320344),
        (45, -59.74810321, 46.121320344),
        (45, -68.550258061, 48.121320344),
        (40, -56.377183724, 44.121320344),
        (35, -59.74810321, 46.121320344),
    ]]
    fillet(fillet3_edges, radius=FILLET3_R)

    # Fillet4
    fillet4_edges = [part.edges().sort_by_distance(p)[0] for p in [
        (-45, -88.981493427, 46.121320344),
        (-35, -88.981493427, 46.121320344),
        (35, -88.981493427, 46.121320344),
        (45, -88.981493427, 46.121320344),
    ]]
    fillet(fillet4_edges, radius=FILLET4_R - 0.0001)  # a hair under: the kernel refuses the full size


solid = part.part
